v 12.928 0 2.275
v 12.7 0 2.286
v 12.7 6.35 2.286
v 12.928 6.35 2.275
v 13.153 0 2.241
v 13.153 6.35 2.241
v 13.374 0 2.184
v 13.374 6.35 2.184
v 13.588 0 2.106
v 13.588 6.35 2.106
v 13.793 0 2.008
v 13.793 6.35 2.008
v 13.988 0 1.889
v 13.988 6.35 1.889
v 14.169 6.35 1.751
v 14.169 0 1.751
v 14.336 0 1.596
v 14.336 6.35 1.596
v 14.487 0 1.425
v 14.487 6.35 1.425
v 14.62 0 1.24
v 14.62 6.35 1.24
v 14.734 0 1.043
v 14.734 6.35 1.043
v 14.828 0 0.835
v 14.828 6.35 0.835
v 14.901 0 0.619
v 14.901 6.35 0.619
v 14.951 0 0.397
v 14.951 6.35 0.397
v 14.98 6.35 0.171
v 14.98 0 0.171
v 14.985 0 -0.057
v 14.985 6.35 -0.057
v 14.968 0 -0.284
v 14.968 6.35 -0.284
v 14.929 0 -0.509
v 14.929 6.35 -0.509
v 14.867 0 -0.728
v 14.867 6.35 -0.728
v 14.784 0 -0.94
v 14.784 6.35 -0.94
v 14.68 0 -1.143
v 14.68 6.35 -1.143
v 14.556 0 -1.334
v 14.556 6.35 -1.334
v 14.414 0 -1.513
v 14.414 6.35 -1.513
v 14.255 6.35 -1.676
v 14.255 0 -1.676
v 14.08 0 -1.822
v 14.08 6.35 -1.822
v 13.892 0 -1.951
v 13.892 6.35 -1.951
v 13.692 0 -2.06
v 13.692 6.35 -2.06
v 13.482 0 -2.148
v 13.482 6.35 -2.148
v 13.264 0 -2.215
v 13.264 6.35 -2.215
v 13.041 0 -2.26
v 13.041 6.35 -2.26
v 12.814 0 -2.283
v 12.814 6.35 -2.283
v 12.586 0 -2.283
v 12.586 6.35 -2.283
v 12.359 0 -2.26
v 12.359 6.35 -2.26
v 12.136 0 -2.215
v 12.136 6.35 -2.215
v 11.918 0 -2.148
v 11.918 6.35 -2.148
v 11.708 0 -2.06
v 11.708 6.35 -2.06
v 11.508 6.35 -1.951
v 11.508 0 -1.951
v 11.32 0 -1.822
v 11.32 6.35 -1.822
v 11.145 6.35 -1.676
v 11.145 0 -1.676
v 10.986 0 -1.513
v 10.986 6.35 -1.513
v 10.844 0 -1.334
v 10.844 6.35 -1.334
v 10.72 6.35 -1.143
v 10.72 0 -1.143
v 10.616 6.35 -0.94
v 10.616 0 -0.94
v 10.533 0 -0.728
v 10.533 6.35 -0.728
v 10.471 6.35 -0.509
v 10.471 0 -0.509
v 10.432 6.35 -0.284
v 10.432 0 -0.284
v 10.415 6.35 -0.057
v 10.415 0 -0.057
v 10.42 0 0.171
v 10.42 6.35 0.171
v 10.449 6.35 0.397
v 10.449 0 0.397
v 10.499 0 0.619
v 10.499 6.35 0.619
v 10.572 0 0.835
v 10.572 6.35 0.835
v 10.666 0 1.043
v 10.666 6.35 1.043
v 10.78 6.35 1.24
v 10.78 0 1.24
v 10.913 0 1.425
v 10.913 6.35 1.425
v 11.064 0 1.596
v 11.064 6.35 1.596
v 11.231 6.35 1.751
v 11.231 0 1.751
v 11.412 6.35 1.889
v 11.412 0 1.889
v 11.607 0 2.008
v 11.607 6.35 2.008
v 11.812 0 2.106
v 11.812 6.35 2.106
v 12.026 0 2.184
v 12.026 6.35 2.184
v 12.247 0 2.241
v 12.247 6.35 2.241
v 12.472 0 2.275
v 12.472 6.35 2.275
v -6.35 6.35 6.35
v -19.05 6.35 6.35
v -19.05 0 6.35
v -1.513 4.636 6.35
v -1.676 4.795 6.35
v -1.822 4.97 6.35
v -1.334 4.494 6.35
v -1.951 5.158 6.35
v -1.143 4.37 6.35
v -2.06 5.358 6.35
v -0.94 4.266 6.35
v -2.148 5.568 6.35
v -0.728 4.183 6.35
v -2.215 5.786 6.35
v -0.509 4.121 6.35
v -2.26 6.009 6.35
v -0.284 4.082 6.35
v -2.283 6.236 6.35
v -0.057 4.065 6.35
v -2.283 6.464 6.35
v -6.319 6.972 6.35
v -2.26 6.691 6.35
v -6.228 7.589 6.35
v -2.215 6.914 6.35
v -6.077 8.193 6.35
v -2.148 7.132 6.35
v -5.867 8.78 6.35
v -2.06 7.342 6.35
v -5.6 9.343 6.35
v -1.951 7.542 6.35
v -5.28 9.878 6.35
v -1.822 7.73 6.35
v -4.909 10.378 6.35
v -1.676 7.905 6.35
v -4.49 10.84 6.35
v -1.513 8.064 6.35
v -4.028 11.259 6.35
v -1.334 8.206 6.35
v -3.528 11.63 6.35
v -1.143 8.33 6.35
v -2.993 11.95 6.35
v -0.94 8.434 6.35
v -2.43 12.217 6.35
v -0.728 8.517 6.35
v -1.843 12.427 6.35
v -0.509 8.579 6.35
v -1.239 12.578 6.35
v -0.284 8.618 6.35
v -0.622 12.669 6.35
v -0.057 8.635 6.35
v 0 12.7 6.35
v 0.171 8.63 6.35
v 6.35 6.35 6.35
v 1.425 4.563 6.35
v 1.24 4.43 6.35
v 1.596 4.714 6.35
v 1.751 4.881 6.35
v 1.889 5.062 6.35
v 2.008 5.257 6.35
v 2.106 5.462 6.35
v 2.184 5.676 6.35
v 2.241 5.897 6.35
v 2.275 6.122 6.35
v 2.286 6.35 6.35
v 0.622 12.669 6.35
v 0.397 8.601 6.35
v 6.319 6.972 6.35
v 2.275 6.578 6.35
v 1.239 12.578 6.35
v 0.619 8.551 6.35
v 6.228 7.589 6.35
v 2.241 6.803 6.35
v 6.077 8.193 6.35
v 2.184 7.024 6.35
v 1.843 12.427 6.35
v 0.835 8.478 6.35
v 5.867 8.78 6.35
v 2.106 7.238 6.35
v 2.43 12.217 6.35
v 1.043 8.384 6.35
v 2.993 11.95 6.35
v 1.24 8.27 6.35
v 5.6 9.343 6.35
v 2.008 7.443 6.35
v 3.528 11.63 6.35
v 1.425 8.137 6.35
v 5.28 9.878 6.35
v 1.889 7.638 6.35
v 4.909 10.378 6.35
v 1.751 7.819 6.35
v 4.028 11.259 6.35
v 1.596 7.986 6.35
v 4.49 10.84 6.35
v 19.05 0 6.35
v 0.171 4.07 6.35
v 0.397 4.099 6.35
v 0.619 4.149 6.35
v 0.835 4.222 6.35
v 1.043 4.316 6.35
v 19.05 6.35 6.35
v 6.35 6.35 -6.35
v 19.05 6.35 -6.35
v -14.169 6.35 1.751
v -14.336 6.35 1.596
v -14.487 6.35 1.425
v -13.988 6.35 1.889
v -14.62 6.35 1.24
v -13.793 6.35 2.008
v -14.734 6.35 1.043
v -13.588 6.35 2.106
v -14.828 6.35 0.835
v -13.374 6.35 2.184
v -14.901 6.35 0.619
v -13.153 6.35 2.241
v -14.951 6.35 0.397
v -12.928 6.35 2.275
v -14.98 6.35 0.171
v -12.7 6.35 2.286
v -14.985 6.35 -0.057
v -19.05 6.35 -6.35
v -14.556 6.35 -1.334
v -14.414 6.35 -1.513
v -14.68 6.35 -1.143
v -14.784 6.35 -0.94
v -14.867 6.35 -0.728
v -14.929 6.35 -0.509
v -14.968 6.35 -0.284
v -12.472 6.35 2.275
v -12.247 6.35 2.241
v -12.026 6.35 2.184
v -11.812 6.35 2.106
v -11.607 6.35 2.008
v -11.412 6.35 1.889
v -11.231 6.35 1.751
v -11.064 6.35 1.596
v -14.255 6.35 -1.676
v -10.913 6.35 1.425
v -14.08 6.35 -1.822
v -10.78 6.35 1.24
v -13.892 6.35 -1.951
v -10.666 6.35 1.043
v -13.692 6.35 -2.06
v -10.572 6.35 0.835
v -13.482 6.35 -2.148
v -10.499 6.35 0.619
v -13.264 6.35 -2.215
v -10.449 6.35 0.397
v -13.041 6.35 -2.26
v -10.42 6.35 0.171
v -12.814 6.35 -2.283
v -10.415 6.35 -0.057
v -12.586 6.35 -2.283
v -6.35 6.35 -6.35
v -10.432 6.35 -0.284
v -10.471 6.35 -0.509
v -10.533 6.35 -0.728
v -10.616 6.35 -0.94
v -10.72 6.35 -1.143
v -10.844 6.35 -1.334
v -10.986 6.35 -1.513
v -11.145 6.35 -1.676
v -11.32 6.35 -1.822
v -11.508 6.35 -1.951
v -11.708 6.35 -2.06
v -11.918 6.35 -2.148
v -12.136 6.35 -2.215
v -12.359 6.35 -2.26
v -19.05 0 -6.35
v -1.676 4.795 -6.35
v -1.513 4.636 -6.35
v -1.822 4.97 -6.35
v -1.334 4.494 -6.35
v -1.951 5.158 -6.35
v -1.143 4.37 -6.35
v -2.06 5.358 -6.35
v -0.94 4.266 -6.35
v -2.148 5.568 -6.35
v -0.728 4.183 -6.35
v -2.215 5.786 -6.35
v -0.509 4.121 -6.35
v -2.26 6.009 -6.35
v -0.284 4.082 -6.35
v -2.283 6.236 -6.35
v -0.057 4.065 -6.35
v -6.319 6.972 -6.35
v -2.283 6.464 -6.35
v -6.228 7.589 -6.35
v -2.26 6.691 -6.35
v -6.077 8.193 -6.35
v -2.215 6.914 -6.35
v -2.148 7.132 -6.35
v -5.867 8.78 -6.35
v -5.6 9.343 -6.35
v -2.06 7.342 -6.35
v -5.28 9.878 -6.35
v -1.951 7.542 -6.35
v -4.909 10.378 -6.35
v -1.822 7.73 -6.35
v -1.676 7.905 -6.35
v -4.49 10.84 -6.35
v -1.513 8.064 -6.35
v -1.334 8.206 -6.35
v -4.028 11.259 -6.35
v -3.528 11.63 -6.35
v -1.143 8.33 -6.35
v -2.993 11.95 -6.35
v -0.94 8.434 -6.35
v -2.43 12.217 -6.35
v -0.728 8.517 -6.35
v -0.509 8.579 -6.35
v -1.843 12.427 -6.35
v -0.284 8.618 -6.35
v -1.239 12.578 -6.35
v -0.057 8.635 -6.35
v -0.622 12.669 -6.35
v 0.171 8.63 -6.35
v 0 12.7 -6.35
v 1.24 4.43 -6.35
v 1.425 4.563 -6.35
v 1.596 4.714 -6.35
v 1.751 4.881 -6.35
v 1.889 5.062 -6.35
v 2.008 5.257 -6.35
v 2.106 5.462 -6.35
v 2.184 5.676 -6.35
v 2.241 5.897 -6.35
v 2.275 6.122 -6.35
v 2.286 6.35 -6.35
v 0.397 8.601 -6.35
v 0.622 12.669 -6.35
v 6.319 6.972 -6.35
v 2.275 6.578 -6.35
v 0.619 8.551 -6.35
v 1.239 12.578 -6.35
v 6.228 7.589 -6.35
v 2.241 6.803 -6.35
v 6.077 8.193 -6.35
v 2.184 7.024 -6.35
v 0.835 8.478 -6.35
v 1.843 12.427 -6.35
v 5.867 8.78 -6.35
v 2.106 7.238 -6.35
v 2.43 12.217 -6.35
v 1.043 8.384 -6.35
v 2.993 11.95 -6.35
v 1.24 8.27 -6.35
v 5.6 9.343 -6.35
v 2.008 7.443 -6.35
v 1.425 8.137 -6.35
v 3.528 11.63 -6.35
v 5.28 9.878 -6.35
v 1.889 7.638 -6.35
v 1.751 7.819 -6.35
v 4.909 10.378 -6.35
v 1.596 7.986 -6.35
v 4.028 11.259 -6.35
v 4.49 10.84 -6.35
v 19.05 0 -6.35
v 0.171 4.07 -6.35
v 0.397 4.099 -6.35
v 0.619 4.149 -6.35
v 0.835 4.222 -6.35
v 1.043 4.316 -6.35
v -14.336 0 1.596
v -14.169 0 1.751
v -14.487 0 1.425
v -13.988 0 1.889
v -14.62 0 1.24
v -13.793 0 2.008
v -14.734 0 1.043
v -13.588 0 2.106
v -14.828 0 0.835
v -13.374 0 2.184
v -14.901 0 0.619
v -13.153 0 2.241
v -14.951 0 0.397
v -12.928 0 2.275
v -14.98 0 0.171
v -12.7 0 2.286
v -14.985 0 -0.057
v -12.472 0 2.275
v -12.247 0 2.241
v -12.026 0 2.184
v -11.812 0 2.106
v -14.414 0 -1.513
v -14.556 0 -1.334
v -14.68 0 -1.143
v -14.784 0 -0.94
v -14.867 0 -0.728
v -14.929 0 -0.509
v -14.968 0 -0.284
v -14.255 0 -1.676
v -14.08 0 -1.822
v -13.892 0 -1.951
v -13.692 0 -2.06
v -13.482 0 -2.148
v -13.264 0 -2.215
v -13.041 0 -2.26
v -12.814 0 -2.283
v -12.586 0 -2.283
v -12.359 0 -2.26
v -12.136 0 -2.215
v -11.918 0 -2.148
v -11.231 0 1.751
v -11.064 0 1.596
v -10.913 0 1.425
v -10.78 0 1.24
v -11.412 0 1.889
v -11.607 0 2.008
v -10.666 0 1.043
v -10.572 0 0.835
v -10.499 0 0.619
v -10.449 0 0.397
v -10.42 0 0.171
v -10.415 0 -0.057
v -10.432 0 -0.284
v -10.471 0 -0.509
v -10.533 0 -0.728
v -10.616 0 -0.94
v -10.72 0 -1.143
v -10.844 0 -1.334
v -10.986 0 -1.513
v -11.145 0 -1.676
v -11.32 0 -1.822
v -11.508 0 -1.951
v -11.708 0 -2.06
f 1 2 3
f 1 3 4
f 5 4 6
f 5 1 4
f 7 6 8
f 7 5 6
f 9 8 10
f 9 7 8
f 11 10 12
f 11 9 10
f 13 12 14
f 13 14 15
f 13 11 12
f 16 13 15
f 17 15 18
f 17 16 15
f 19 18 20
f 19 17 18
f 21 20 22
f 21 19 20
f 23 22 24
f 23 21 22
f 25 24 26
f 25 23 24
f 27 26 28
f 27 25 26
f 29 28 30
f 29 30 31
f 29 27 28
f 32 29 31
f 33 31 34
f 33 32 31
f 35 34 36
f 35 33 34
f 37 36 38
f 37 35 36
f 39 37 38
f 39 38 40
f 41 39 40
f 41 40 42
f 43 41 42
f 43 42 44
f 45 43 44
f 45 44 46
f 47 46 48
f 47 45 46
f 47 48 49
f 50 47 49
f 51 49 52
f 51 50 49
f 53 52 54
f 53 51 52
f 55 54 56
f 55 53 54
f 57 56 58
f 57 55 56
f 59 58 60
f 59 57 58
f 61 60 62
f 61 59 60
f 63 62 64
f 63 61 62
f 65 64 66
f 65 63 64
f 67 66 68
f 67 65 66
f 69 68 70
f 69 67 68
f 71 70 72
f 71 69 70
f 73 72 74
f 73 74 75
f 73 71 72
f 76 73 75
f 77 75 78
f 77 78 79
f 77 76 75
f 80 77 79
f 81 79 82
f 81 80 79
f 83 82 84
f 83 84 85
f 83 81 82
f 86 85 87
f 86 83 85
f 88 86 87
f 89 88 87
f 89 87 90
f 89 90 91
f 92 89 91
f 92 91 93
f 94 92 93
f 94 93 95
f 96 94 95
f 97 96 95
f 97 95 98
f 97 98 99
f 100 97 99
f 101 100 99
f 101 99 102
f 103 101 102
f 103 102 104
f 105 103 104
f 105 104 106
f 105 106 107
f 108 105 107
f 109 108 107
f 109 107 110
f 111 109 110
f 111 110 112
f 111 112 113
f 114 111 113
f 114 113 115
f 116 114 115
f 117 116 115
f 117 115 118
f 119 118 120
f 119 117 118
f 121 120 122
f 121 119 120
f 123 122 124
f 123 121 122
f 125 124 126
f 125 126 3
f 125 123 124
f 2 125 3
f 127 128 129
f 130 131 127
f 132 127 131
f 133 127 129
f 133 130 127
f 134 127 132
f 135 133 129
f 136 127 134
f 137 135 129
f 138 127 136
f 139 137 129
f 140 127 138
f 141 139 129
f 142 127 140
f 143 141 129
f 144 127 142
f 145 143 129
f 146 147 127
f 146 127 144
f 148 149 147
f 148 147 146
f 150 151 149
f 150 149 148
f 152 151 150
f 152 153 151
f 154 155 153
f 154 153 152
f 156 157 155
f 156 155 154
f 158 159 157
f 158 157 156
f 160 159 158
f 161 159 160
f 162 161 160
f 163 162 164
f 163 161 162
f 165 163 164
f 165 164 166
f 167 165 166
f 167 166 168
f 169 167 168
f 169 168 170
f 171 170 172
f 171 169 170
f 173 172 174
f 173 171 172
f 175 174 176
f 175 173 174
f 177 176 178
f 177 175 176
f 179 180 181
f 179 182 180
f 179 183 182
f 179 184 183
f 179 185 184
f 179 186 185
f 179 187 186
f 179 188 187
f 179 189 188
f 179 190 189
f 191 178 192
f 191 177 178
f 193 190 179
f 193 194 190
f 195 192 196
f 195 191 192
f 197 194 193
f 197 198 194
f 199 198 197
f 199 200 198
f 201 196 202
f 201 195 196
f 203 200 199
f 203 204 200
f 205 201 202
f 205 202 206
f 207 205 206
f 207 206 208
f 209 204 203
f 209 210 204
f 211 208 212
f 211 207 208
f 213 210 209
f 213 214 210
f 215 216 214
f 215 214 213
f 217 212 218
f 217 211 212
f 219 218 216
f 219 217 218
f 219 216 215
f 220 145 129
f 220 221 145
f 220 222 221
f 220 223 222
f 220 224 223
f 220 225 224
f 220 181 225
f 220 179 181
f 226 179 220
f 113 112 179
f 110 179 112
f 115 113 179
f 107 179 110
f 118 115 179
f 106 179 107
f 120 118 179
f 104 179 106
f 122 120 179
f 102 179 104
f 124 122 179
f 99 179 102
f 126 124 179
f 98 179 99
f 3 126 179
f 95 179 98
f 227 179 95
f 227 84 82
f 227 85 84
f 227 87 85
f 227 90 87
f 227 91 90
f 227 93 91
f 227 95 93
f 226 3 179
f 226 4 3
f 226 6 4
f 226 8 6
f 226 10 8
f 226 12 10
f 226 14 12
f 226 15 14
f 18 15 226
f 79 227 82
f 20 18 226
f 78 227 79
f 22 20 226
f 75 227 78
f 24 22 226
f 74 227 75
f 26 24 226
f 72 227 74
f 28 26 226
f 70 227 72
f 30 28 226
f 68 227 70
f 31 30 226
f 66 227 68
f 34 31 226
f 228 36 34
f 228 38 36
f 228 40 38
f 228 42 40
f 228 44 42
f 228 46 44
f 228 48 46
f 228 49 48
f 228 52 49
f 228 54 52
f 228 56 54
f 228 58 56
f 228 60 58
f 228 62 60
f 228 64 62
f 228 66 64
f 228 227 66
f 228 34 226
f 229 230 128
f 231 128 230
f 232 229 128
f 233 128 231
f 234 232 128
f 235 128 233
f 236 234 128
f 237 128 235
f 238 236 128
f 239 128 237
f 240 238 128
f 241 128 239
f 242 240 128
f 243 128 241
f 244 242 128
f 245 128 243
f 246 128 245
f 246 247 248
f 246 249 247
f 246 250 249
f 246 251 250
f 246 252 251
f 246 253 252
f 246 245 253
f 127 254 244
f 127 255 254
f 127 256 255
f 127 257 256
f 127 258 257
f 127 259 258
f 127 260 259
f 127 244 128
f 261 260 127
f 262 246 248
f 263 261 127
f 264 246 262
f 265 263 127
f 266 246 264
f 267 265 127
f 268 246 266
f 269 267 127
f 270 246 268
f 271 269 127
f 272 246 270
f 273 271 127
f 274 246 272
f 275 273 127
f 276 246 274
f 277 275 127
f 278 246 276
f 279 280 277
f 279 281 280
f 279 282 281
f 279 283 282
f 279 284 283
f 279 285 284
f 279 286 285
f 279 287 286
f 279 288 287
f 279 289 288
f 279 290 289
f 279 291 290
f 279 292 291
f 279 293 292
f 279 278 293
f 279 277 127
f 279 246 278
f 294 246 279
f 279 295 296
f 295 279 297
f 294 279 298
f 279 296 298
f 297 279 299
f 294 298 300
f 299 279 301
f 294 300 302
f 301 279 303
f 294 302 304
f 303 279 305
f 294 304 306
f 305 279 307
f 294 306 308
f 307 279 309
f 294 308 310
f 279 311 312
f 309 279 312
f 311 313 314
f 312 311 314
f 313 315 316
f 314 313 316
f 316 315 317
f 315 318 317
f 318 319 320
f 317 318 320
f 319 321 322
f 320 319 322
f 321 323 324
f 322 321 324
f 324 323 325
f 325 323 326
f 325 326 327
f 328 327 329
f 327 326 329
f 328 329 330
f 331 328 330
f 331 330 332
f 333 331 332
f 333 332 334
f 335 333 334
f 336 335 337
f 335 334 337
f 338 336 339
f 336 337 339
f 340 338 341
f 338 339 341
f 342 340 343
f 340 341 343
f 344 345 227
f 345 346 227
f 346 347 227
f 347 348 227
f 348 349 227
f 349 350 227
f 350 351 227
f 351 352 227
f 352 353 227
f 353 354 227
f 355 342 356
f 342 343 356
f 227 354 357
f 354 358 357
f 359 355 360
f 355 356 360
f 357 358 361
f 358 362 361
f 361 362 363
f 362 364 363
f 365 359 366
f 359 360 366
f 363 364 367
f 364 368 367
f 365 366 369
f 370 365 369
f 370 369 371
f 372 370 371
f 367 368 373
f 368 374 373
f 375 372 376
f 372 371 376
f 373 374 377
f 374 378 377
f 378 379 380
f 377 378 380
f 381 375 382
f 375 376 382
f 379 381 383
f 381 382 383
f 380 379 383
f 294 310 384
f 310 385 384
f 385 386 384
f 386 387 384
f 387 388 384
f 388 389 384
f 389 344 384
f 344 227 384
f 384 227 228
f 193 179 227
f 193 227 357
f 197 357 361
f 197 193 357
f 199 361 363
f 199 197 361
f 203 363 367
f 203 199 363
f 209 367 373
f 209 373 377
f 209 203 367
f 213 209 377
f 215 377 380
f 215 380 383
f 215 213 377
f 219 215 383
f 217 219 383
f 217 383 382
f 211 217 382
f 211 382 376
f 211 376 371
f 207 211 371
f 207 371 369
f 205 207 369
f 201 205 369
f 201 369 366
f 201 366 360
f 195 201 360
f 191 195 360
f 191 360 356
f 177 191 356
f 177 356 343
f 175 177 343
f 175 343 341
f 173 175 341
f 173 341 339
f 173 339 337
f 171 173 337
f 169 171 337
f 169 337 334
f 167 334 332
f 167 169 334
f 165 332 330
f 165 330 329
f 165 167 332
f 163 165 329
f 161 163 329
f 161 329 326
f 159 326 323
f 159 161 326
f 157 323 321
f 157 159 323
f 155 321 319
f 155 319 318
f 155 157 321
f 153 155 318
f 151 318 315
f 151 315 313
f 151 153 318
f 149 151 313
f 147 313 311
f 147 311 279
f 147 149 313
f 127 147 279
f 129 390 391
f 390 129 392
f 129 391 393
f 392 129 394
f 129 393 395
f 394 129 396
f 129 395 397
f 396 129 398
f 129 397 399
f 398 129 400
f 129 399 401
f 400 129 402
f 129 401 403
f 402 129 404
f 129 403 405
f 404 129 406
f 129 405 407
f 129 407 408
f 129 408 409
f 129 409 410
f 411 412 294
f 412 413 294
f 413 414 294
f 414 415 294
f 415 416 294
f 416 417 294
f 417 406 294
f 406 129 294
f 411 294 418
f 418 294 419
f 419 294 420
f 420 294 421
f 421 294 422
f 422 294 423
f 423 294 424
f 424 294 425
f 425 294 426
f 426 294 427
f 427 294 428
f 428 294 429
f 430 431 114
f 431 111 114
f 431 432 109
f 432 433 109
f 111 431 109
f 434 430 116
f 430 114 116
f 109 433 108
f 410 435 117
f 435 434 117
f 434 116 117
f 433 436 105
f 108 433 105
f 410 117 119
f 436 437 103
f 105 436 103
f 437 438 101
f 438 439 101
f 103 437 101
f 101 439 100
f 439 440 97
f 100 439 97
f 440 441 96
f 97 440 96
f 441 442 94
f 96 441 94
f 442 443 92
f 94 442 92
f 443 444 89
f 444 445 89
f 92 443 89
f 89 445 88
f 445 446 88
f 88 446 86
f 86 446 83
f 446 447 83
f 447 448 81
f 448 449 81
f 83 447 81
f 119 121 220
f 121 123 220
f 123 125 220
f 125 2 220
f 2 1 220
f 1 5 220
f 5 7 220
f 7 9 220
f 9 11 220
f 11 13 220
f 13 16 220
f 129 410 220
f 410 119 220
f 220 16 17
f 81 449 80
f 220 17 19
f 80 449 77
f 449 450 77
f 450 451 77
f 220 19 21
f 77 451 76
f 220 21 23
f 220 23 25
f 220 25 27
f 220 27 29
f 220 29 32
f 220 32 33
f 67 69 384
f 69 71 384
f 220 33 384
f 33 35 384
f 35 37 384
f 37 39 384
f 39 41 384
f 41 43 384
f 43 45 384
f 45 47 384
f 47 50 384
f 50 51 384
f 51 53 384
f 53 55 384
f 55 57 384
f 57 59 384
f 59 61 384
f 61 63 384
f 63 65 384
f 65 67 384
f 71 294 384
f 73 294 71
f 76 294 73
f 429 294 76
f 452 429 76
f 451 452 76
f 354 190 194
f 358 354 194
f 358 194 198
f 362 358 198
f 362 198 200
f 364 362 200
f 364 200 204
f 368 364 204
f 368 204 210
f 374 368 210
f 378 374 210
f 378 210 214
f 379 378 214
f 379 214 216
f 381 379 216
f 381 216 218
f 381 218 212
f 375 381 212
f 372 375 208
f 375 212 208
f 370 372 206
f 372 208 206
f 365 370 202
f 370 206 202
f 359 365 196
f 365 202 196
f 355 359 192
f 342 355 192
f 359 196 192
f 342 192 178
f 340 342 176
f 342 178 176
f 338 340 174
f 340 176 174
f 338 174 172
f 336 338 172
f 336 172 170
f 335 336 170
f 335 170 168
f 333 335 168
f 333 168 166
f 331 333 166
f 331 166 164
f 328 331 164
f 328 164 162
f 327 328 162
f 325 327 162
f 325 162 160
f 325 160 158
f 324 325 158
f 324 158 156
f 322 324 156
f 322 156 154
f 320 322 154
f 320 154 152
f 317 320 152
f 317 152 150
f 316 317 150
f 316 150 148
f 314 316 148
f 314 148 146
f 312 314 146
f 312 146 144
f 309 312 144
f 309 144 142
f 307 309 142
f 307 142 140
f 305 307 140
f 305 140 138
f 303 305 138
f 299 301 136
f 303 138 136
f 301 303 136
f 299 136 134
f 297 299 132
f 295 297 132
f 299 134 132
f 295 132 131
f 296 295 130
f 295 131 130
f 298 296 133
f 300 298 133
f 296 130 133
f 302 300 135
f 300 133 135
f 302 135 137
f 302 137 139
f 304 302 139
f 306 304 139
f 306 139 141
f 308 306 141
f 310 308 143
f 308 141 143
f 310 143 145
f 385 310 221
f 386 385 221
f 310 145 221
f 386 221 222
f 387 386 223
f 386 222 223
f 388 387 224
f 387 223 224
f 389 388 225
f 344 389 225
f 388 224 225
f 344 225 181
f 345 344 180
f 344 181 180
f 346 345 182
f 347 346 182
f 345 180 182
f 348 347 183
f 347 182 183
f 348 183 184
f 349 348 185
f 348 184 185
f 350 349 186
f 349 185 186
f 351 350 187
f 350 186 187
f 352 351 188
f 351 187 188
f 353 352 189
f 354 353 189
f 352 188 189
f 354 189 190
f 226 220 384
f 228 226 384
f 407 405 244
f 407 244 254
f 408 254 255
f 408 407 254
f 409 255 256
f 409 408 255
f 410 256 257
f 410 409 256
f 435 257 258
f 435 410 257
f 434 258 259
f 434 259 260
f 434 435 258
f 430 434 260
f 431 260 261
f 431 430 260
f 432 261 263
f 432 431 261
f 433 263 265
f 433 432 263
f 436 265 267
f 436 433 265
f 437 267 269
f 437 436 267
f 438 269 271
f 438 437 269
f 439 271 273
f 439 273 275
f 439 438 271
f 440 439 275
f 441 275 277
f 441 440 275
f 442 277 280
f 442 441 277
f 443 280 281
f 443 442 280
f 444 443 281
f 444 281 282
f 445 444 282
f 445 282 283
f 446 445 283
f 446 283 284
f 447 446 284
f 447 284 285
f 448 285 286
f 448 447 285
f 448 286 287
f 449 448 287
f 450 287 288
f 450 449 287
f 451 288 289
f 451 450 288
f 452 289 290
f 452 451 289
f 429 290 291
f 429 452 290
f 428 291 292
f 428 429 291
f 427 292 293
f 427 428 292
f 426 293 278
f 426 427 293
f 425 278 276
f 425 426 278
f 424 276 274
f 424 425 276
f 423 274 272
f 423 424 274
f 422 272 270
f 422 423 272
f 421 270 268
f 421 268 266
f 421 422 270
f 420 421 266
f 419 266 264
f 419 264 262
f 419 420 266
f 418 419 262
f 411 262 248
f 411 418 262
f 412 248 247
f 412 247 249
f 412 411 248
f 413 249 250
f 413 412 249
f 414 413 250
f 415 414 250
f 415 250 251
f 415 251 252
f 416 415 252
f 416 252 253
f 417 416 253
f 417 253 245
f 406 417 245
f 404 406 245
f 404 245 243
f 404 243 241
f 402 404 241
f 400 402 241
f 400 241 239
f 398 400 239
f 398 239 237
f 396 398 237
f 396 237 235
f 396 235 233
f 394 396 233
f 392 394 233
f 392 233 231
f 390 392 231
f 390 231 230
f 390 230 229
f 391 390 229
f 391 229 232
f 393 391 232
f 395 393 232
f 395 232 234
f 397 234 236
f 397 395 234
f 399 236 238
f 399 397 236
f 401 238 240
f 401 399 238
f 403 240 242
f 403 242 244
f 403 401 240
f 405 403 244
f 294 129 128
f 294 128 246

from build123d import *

# Parameters (mm, degrees)
SKETCH1_W           = 38.1
SKETCH1_H           = 12.7
SKETCH1_R           = 2.286
BOSS_EXTRUDE1_DEPTH = 6.35
SKETCH4_R           = 6.35
BOSS_EXTRUDE2_DEPTH = 12.7
SKETCH2_R           = 2.286
CUT_EXTRUDE1_DEPTH  = 27.181720723


with BuildPart() as part:
    # Sketch1 → Boss-Extrude1 (new body)
    with BuildSketch(Plane(origin=(0, 0, 0), x_dir=(1, 0, 0), z_dir=(0, 1, 0))):
        Rectangle(SKETCH1_W, SKETCH1_H)
        with Locations(Location((-12.7, 0, 0), (0, 0, 270))):
            Circle(SKETCH1_R, mode=Mode.SUBTRACT)
        with Locations(Location((12.7, 0, 0), (0, 0, 270))):
            Circle(SKETCH1_R, mode=Mode.SUBTRACT)
    extrude(amount=BOSS_EXTRUDE1_DEPTH)

    # Sketch4 → Boss-Extrude2 (add)
    with BuildSketch(Plane.XY.offset(6.35)):
        with Locations((0, 6.35)):
            Circle(SKETCH4_R)
    extrude(amount=-BOSS_EXTRUDE2_DEPTH)

    # Sketch2 → Cut-Extrude1 (cut, through all)
    with BuildSketch(Plane.XY.offset(6.35)):
        with Locations((0, 6.35)):
            Circle(SKETCH2_R)
    extrude(amount=-CUT_EXTRUDE1_DEPTH, mode=Mode.SUBTRACT)


solid = part.part
